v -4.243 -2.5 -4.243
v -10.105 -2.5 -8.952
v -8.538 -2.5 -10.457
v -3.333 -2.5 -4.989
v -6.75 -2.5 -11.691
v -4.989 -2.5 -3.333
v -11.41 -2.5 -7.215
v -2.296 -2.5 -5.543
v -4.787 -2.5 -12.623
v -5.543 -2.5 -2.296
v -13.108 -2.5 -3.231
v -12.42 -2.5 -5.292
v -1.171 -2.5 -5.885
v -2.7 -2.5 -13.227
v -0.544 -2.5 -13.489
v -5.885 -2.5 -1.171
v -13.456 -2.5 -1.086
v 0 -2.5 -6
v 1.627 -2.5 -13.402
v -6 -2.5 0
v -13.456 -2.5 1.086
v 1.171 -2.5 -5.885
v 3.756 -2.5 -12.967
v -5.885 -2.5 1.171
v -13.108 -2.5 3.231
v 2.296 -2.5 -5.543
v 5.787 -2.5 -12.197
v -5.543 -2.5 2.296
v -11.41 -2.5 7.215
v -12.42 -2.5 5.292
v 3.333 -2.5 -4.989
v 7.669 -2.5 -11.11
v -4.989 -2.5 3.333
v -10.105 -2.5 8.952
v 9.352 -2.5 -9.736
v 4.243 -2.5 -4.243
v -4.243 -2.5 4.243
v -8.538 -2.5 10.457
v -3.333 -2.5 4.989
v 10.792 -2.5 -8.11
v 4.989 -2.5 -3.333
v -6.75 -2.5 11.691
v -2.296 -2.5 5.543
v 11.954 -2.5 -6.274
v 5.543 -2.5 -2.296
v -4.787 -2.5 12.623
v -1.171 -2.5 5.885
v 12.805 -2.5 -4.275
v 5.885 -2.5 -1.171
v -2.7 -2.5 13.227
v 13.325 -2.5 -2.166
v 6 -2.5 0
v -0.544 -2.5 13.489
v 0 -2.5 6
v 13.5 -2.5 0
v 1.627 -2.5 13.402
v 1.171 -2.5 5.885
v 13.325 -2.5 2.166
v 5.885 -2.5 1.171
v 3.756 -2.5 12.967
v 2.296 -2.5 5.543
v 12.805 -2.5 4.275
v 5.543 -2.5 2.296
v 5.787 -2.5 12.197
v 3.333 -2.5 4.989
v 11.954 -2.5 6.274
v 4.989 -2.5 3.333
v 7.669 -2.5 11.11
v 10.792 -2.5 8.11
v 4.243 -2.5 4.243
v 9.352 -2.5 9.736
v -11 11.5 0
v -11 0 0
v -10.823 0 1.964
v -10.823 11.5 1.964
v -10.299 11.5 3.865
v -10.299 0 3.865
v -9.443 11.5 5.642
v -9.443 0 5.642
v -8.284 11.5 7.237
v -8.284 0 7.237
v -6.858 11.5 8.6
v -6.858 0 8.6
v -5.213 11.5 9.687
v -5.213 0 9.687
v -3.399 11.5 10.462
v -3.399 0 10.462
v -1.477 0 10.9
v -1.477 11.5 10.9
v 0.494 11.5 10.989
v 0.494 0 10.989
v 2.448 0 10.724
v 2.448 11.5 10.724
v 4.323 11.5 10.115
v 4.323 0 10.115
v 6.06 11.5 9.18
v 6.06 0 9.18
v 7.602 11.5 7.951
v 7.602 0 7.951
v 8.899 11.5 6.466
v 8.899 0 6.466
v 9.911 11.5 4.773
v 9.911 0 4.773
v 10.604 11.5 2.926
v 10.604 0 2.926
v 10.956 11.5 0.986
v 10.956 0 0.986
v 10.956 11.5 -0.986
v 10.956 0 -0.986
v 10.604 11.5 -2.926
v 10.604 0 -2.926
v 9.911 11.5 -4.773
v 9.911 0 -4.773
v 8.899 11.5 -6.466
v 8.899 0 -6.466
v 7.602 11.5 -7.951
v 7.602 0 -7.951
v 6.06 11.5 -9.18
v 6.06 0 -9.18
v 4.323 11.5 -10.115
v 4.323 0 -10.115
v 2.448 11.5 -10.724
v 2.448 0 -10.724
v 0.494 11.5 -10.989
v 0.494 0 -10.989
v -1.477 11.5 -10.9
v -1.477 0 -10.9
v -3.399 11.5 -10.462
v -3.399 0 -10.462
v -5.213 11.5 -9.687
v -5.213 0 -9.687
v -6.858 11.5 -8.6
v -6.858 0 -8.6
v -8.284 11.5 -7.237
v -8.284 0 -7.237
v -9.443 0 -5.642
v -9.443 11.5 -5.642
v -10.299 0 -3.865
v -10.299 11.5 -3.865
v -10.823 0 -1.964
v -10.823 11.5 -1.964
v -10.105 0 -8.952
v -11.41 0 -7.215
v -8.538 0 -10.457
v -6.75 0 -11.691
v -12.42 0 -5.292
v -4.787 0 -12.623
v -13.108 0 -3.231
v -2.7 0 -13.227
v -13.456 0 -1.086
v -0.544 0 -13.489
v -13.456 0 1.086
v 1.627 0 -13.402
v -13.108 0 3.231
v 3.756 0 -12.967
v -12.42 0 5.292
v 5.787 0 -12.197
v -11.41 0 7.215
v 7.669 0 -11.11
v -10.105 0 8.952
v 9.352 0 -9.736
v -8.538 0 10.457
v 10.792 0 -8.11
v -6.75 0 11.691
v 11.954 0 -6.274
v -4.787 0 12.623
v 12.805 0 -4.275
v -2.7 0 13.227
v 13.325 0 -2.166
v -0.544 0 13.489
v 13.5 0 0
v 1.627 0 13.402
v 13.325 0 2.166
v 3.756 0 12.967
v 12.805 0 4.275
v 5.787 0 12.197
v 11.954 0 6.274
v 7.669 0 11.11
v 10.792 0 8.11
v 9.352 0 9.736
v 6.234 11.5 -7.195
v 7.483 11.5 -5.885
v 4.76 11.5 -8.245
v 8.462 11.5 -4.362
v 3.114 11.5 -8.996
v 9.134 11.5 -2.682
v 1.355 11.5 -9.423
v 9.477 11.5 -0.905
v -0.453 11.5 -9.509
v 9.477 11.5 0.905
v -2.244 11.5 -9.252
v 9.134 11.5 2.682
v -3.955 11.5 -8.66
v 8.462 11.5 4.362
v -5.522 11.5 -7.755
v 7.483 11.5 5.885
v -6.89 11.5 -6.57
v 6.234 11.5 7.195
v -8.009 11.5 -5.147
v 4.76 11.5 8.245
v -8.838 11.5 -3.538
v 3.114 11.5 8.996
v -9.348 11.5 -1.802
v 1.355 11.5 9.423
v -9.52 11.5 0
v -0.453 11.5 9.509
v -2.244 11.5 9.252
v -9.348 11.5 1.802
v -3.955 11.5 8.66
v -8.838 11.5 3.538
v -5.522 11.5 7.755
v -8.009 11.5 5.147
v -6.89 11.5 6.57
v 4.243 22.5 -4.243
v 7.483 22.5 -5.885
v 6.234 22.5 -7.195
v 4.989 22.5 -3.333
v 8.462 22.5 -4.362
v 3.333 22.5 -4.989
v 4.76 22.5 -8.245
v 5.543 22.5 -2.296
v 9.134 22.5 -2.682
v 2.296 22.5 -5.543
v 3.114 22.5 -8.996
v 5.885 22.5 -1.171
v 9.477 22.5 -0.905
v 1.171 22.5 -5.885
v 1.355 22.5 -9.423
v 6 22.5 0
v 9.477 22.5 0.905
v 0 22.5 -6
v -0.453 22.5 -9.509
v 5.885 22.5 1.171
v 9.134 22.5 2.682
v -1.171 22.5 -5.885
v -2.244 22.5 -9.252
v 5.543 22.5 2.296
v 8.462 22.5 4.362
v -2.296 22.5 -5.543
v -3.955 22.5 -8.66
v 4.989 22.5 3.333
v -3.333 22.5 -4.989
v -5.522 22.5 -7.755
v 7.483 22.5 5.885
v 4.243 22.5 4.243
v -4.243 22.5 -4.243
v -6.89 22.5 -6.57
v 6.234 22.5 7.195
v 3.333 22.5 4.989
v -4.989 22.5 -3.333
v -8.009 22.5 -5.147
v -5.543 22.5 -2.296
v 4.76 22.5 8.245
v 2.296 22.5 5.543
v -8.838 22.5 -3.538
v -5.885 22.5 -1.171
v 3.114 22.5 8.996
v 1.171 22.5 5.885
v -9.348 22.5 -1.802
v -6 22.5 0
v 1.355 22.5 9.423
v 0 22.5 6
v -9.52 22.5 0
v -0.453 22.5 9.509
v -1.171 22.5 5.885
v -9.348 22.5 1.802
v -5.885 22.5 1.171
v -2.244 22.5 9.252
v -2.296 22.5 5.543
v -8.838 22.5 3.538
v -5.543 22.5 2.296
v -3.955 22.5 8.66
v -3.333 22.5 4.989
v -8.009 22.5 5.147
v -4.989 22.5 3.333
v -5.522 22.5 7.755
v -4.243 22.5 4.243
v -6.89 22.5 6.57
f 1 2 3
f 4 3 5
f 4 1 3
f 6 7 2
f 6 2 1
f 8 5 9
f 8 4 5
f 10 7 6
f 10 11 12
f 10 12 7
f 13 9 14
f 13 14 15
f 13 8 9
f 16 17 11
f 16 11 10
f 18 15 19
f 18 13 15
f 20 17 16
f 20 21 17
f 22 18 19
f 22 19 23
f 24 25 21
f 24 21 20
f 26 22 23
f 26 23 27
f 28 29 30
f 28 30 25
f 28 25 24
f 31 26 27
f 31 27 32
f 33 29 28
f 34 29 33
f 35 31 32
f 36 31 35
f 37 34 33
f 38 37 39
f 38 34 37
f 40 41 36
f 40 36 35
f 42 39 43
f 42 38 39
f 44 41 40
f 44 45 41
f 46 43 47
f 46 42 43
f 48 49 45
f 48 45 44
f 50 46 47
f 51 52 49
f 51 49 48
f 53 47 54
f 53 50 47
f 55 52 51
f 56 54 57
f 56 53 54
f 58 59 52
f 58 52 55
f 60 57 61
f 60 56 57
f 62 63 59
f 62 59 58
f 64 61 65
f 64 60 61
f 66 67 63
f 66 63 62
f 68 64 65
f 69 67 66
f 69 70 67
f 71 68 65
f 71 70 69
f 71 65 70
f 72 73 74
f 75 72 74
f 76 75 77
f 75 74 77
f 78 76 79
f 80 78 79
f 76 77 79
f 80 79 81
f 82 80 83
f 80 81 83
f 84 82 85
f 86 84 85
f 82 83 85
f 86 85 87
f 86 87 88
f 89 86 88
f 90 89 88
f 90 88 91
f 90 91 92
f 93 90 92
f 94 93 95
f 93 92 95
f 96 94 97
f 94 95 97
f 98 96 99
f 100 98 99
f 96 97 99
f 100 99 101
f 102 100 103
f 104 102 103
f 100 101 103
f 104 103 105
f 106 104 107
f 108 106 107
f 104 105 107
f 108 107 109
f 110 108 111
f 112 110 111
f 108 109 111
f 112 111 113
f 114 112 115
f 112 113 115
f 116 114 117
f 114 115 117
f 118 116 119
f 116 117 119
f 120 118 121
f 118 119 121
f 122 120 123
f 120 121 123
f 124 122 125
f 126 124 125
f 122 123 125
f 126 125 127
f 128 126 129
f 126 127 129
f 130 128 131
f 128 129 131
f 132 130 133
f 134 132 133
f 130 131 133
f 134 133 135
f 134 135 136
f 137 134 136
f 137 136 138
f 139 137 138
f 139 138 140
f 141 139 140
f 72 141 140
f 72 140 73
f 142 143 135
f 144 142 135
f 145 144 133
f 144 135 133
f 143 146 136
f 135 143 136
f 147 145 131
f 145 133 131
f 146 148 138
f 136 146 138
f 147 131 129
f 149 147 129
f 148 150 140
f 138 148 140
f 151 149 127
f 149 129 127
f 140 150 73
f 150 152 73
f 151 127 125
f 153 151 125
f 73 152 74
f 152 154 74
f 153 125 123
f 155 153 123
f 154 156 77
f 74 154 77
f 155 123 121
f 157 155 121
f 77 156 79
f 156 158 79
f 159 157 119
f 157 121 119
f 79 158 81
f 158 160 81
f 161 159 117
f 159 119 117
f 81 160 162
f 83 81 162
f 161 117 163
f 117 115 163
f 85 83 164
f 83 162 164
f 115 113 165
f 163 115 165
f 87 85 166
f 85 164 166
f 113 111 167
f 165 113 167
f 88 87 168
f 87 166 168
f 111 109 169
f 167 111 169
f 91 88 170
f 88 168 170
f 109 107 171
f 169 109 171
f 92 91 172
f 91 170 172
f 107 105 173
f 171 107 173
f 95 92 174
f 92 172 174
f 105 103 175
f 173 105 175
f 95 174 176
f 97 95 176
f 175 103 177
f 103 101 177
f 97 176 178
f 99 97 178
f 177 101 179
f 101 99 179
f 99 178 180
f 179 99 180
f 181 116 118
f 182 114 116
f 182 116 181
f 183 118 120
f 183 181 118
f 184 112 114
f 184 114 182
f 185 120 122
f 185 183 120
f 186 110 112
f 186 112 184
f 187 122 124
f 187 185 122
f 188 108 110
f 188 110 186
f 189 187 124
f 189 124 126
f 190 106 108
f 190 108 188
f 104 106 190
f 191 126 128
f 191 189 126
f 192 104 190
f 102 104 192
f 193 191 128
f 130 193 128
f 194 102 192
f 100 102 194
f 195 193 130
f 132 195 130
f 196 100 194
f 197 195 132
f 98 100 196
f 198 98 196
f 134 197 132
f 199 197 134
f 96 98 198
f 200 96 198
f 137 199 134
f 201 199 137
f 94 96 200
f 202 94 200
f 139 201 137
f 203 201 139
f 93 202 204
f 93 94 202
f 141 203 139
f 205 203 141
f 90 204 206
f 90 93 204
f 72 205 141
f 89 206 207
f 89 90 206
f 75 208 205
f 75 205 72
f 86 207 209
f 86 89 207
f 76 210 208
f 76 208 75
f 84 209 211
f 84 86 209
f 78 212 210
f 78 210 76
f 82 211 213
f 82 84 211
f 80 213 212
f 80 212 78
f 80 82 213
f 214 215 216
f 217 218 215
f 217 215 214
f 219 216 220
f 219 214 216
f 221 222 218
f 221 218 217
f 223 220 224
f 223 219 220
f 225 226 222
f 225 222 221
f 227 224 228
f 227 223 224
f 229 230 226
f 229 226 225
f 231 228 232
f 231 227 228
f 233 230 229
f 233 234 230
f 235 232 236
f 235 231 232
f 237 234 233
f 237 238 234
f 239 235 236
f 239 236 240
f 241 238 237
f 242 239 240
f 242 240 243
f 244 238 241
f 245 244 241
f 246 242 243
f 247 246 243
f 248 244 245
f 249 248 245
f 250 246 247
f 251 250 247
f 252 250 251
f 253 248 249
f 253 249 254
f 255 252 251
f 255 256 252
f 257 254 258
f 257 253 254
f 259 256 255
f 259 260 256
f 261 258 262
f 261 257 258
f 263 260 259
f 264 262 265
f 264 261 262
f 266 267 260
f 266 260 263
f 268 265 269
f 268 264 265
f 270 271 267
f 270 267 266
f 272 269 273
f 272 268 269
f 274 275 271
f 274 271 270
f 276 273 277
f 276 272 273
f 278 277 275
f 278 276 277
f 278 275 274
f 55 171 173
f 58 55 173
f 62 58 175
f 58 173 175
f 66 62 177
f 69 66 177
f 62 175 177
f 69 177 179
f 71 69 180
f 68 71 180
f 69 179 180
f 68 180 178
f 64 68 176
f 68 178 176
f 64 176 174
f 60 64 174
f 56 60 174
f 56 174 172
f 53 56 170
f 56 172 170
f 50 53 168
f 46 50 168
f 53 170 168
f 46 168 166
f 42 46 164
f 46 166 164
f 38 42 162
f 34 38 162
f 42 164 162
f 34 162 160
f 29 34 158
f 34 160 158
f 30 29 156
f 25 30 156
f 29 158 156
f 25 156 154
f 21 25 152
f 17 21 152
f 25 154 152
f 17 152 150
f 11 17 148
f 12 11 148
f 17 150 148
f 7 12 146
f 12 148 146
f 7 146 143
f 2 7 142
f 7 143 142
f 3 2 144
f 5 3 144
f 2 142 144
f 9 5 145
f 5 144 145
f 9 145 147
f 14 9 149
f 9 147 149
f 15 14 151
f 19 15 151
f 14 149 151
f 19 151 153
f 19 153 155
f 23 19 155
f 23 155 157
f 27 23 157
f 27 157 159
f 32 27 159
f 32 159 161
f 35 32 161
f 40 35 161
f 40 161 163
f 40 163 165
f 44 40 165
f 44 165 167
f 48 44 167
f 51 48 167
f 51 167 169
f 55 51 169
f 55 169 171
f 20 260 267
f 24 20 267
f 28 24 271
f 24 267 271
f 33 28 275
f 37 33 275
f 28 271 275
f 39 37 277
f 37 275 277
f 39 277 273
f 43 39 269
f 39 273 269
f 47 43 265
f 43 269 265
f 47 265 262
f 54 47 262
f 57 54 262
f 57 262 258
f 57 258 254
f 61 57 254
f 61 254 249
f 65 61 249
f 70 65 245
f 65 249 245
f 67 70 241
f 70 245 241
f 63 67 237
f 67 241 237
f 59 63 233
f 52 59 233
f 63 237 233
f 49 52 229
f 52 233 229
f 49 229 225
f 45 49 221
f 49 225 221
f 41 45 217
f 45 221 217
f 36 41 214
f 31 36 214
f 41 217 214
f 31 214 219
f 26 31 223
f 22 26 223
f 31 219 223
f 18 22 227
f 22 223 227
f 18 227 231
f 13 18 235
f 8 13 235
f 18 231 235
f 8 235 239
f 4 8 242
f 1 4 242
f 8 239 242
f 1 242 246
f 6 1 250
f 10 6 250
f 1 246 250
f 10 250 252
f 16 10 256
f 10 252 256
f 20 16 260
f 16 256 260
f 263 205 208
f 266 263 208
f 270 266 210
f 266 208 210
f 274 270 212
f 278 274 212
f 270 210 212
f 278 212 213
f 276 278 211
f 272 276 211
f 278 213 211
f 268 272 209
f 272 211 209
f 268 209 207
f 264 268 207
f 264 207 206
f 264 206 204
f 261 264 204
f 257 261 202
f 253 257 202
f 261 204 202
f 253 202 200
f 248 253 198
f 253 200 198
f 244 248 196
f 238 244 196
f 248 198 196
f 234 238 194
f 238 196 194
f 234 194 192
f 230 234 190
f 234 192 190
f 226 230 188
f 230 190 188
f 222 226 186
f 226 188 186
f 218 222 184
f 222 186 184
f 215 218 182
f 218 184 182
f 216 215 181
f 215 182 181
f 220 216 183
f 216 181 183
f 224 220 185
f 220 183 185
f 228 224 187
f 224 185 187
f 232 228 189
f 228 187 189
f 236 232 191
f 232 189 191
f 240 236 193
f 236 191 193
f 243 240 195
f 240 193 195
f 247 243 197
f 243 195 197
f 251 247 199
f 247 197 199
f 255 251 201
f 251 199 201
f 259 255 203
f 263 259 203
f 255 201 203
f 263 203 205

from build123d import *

# Parameters (mm, degrees)
F0_R     = 13.5
F0_R_2   = 11.985483
F1_DEPTH = 2.5
F2_R     = 11
F3_DEPTH = 11.5
F4_R     = 9.52
F5_DEPTH = 11
F6_R     = 6
F7_DEPTH = 25


with BuildPart() as f1:
    # F0 (on Front) → F1 (new body)
    with BuildSketch(Plane.XZ):
        Circle(F0_R)
        Circle(F0_R_2, mode=Mode.SUBTRACT)
        Circle(F0_R_2)
    extrude(amount=F1_DEPTH)

    # F2 (on face) → F3 (join)
    with BuildSketch(Plane(origin=(0, 0, 0), x_dir=(-1, 0, 0), z_dir=(0, 1, 0))):
        Circle(F2_R)
    extrude(amount=F3_DEPTH)

    # F4 (on face) → F5 (join)
    with BuildSketch(Plane(origin=(0, 11.5, 0), x_dir=(-1, 0, 0), z_dir=(0, 1, 0))):
        Circle(F4_R)
    extrude(amount=F5_DEPTH)

    # F6 (on face) → F7 (cut)
    with BuildSketch(Plane(origin=(0, 22.5, 0), x_dir=(-1, 0, 0), z_dir=(0, 1, 0))):
        Circle(F6_R)
    extrude(amount=-F7_DEPTH, mode=Mode.SUBTRACT)


solid = f1.part
